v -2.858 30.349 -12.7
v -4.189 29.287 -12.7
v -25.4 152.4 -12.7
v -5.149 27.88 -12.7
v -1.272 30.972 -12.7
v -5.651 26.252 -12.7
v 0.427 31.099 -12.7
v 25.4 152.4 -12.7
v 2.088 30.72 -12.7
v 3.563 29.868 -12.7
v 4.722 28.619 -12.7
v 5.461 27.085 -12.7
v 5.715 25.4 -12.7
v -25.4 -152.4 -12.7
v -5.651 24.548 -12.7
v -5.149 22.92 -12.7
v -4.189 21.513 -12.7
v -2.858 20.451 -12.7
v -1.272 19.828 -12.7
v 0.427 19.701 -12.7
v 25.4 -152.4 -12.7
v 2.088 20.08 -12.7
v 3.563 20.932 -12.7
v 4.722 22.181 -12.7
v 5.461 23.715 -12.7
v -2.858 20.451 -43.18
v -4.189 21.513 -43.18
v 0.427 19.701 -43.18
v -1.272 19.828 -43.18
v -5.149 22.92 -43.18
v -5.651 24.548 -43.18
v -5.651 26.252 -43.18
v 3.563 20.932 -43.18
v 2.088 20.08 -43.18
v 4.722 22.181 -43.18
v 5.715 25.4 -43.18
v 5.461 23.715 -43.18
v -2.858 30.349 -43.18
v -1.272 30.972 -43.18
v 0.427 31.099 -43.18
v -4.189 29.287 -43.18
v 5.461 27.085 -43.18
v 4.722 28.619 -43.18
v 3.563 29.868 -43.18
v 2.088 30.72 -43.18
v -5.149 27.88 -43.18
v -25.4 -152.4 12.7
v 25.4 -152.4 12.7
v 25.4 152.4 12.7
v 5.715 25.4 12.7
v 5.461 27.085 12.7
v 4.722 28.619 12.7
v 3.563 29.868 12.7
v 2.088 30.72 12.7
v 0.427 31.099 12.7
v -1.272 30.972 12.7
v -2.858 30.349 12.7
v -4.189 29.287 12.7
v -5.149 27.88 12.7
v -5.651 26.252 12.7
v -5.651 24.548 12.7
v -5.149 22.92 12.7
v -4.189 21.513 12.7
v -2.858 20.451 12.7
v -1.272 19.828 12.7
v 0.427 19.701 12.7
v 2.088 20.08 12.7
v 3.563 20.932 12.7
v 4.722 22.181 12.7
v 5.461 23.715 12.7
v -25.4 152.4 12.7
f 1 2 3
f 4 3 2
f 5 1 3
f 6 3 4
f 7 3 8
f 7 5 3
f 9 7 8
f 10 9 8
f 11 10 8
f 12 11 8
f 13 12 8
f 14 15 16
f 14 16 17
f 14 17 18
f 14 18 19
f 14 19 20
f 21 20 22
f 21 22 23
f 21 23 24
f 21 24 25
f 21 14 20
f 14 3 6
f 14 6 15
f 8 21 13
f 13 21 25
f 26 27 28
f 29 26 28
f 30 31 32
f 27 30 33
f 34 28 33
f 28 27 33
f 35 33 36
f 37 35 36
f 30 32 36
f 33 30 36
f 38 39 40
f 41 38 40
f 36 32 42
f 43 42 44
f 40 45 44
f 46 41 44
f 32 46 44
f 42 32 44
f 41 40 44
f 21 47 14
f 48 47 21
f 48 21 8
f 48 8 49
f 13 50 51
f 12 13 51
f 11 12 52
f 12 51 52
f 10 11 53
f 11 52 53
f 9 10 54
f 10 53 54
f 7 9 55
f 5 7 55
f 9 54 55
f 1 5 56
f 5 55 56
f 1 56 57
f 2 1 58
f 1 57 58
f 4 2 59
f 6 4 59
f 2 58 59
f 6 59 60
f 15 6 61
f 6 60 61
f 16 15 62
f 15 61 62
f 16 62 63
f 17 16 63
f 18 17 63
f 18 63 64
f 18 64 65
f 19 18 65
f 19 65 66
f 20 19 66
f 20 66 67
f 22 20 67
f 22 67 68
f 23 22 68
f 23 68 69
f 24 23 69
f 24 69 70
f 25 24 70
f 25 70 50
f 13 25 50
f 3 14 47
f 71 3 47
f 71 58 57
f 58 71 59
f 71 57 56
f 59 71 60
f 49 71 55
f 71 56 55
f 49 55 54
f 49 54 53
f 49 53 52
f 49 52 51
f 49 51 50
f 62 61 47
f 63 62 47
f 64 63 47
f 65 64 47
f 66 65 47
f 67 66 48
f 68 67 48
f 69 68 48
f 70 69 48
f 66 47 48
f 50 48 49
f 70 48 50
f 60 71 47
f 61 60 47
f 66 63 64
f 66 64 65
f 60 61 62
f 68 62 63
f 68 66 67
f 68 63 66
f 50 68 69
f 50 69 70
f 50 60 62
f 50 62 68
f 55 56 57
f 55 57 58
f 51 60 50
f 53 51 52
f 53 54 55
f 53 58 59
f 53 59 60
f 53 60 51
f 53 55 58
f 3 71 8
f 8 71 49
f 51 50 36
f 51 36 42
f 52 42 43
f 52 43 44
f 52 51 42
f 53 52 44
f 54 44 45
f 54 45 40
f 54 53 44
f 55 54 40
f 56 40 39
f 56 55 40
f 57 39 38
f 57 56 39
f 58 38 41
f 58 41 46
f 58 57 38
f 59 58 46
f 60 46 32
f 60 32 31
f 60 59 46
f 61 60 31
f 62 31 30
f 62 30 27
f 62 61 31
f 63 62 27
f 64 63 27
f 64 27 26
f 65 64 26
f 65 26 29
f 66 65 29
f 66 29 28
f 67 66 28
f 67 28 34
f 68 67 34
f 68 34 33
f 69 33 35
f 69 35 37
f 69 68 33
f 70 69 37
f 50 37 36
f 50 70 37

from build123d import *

# Parameters (mm, degrees)
F0_W     = 50.8
F0_H     = 25.4
F1_DEPTH = 152.4
F2_R     = 5.715
F3_DEPTH = 25.401
F4_DEPTH = 55.88


with BuildPart() as f1:
    # F0 (on Front) → F1 (new body, symmetric)
    with BuildSketch(Plane.XZ):
        Rectangle(F0_W, F0_H)
    extrude(amount=F1_DEPTH, both=True)

    # F2 (on face) → F3 (cut, through all)
    with BuildSketch(Plane.XY.offset(12.7)):
        with Locations((0, 25.4)):
            Circle(F2_R)
    extrude(amount=-F3_DEPTH, mode=Mode.SUBTRACT)


with BuildPart() as f4:
    # F2 (on face) → F4 (new body)
    with BuildSketch(Plane.XY.offset(12.7)):
        with Locations((0, 25.4)):
            Circle(F2_R)
    extrude(amount=-F4_DEPTH)


solid = Compound([f1.part, f4.part])
